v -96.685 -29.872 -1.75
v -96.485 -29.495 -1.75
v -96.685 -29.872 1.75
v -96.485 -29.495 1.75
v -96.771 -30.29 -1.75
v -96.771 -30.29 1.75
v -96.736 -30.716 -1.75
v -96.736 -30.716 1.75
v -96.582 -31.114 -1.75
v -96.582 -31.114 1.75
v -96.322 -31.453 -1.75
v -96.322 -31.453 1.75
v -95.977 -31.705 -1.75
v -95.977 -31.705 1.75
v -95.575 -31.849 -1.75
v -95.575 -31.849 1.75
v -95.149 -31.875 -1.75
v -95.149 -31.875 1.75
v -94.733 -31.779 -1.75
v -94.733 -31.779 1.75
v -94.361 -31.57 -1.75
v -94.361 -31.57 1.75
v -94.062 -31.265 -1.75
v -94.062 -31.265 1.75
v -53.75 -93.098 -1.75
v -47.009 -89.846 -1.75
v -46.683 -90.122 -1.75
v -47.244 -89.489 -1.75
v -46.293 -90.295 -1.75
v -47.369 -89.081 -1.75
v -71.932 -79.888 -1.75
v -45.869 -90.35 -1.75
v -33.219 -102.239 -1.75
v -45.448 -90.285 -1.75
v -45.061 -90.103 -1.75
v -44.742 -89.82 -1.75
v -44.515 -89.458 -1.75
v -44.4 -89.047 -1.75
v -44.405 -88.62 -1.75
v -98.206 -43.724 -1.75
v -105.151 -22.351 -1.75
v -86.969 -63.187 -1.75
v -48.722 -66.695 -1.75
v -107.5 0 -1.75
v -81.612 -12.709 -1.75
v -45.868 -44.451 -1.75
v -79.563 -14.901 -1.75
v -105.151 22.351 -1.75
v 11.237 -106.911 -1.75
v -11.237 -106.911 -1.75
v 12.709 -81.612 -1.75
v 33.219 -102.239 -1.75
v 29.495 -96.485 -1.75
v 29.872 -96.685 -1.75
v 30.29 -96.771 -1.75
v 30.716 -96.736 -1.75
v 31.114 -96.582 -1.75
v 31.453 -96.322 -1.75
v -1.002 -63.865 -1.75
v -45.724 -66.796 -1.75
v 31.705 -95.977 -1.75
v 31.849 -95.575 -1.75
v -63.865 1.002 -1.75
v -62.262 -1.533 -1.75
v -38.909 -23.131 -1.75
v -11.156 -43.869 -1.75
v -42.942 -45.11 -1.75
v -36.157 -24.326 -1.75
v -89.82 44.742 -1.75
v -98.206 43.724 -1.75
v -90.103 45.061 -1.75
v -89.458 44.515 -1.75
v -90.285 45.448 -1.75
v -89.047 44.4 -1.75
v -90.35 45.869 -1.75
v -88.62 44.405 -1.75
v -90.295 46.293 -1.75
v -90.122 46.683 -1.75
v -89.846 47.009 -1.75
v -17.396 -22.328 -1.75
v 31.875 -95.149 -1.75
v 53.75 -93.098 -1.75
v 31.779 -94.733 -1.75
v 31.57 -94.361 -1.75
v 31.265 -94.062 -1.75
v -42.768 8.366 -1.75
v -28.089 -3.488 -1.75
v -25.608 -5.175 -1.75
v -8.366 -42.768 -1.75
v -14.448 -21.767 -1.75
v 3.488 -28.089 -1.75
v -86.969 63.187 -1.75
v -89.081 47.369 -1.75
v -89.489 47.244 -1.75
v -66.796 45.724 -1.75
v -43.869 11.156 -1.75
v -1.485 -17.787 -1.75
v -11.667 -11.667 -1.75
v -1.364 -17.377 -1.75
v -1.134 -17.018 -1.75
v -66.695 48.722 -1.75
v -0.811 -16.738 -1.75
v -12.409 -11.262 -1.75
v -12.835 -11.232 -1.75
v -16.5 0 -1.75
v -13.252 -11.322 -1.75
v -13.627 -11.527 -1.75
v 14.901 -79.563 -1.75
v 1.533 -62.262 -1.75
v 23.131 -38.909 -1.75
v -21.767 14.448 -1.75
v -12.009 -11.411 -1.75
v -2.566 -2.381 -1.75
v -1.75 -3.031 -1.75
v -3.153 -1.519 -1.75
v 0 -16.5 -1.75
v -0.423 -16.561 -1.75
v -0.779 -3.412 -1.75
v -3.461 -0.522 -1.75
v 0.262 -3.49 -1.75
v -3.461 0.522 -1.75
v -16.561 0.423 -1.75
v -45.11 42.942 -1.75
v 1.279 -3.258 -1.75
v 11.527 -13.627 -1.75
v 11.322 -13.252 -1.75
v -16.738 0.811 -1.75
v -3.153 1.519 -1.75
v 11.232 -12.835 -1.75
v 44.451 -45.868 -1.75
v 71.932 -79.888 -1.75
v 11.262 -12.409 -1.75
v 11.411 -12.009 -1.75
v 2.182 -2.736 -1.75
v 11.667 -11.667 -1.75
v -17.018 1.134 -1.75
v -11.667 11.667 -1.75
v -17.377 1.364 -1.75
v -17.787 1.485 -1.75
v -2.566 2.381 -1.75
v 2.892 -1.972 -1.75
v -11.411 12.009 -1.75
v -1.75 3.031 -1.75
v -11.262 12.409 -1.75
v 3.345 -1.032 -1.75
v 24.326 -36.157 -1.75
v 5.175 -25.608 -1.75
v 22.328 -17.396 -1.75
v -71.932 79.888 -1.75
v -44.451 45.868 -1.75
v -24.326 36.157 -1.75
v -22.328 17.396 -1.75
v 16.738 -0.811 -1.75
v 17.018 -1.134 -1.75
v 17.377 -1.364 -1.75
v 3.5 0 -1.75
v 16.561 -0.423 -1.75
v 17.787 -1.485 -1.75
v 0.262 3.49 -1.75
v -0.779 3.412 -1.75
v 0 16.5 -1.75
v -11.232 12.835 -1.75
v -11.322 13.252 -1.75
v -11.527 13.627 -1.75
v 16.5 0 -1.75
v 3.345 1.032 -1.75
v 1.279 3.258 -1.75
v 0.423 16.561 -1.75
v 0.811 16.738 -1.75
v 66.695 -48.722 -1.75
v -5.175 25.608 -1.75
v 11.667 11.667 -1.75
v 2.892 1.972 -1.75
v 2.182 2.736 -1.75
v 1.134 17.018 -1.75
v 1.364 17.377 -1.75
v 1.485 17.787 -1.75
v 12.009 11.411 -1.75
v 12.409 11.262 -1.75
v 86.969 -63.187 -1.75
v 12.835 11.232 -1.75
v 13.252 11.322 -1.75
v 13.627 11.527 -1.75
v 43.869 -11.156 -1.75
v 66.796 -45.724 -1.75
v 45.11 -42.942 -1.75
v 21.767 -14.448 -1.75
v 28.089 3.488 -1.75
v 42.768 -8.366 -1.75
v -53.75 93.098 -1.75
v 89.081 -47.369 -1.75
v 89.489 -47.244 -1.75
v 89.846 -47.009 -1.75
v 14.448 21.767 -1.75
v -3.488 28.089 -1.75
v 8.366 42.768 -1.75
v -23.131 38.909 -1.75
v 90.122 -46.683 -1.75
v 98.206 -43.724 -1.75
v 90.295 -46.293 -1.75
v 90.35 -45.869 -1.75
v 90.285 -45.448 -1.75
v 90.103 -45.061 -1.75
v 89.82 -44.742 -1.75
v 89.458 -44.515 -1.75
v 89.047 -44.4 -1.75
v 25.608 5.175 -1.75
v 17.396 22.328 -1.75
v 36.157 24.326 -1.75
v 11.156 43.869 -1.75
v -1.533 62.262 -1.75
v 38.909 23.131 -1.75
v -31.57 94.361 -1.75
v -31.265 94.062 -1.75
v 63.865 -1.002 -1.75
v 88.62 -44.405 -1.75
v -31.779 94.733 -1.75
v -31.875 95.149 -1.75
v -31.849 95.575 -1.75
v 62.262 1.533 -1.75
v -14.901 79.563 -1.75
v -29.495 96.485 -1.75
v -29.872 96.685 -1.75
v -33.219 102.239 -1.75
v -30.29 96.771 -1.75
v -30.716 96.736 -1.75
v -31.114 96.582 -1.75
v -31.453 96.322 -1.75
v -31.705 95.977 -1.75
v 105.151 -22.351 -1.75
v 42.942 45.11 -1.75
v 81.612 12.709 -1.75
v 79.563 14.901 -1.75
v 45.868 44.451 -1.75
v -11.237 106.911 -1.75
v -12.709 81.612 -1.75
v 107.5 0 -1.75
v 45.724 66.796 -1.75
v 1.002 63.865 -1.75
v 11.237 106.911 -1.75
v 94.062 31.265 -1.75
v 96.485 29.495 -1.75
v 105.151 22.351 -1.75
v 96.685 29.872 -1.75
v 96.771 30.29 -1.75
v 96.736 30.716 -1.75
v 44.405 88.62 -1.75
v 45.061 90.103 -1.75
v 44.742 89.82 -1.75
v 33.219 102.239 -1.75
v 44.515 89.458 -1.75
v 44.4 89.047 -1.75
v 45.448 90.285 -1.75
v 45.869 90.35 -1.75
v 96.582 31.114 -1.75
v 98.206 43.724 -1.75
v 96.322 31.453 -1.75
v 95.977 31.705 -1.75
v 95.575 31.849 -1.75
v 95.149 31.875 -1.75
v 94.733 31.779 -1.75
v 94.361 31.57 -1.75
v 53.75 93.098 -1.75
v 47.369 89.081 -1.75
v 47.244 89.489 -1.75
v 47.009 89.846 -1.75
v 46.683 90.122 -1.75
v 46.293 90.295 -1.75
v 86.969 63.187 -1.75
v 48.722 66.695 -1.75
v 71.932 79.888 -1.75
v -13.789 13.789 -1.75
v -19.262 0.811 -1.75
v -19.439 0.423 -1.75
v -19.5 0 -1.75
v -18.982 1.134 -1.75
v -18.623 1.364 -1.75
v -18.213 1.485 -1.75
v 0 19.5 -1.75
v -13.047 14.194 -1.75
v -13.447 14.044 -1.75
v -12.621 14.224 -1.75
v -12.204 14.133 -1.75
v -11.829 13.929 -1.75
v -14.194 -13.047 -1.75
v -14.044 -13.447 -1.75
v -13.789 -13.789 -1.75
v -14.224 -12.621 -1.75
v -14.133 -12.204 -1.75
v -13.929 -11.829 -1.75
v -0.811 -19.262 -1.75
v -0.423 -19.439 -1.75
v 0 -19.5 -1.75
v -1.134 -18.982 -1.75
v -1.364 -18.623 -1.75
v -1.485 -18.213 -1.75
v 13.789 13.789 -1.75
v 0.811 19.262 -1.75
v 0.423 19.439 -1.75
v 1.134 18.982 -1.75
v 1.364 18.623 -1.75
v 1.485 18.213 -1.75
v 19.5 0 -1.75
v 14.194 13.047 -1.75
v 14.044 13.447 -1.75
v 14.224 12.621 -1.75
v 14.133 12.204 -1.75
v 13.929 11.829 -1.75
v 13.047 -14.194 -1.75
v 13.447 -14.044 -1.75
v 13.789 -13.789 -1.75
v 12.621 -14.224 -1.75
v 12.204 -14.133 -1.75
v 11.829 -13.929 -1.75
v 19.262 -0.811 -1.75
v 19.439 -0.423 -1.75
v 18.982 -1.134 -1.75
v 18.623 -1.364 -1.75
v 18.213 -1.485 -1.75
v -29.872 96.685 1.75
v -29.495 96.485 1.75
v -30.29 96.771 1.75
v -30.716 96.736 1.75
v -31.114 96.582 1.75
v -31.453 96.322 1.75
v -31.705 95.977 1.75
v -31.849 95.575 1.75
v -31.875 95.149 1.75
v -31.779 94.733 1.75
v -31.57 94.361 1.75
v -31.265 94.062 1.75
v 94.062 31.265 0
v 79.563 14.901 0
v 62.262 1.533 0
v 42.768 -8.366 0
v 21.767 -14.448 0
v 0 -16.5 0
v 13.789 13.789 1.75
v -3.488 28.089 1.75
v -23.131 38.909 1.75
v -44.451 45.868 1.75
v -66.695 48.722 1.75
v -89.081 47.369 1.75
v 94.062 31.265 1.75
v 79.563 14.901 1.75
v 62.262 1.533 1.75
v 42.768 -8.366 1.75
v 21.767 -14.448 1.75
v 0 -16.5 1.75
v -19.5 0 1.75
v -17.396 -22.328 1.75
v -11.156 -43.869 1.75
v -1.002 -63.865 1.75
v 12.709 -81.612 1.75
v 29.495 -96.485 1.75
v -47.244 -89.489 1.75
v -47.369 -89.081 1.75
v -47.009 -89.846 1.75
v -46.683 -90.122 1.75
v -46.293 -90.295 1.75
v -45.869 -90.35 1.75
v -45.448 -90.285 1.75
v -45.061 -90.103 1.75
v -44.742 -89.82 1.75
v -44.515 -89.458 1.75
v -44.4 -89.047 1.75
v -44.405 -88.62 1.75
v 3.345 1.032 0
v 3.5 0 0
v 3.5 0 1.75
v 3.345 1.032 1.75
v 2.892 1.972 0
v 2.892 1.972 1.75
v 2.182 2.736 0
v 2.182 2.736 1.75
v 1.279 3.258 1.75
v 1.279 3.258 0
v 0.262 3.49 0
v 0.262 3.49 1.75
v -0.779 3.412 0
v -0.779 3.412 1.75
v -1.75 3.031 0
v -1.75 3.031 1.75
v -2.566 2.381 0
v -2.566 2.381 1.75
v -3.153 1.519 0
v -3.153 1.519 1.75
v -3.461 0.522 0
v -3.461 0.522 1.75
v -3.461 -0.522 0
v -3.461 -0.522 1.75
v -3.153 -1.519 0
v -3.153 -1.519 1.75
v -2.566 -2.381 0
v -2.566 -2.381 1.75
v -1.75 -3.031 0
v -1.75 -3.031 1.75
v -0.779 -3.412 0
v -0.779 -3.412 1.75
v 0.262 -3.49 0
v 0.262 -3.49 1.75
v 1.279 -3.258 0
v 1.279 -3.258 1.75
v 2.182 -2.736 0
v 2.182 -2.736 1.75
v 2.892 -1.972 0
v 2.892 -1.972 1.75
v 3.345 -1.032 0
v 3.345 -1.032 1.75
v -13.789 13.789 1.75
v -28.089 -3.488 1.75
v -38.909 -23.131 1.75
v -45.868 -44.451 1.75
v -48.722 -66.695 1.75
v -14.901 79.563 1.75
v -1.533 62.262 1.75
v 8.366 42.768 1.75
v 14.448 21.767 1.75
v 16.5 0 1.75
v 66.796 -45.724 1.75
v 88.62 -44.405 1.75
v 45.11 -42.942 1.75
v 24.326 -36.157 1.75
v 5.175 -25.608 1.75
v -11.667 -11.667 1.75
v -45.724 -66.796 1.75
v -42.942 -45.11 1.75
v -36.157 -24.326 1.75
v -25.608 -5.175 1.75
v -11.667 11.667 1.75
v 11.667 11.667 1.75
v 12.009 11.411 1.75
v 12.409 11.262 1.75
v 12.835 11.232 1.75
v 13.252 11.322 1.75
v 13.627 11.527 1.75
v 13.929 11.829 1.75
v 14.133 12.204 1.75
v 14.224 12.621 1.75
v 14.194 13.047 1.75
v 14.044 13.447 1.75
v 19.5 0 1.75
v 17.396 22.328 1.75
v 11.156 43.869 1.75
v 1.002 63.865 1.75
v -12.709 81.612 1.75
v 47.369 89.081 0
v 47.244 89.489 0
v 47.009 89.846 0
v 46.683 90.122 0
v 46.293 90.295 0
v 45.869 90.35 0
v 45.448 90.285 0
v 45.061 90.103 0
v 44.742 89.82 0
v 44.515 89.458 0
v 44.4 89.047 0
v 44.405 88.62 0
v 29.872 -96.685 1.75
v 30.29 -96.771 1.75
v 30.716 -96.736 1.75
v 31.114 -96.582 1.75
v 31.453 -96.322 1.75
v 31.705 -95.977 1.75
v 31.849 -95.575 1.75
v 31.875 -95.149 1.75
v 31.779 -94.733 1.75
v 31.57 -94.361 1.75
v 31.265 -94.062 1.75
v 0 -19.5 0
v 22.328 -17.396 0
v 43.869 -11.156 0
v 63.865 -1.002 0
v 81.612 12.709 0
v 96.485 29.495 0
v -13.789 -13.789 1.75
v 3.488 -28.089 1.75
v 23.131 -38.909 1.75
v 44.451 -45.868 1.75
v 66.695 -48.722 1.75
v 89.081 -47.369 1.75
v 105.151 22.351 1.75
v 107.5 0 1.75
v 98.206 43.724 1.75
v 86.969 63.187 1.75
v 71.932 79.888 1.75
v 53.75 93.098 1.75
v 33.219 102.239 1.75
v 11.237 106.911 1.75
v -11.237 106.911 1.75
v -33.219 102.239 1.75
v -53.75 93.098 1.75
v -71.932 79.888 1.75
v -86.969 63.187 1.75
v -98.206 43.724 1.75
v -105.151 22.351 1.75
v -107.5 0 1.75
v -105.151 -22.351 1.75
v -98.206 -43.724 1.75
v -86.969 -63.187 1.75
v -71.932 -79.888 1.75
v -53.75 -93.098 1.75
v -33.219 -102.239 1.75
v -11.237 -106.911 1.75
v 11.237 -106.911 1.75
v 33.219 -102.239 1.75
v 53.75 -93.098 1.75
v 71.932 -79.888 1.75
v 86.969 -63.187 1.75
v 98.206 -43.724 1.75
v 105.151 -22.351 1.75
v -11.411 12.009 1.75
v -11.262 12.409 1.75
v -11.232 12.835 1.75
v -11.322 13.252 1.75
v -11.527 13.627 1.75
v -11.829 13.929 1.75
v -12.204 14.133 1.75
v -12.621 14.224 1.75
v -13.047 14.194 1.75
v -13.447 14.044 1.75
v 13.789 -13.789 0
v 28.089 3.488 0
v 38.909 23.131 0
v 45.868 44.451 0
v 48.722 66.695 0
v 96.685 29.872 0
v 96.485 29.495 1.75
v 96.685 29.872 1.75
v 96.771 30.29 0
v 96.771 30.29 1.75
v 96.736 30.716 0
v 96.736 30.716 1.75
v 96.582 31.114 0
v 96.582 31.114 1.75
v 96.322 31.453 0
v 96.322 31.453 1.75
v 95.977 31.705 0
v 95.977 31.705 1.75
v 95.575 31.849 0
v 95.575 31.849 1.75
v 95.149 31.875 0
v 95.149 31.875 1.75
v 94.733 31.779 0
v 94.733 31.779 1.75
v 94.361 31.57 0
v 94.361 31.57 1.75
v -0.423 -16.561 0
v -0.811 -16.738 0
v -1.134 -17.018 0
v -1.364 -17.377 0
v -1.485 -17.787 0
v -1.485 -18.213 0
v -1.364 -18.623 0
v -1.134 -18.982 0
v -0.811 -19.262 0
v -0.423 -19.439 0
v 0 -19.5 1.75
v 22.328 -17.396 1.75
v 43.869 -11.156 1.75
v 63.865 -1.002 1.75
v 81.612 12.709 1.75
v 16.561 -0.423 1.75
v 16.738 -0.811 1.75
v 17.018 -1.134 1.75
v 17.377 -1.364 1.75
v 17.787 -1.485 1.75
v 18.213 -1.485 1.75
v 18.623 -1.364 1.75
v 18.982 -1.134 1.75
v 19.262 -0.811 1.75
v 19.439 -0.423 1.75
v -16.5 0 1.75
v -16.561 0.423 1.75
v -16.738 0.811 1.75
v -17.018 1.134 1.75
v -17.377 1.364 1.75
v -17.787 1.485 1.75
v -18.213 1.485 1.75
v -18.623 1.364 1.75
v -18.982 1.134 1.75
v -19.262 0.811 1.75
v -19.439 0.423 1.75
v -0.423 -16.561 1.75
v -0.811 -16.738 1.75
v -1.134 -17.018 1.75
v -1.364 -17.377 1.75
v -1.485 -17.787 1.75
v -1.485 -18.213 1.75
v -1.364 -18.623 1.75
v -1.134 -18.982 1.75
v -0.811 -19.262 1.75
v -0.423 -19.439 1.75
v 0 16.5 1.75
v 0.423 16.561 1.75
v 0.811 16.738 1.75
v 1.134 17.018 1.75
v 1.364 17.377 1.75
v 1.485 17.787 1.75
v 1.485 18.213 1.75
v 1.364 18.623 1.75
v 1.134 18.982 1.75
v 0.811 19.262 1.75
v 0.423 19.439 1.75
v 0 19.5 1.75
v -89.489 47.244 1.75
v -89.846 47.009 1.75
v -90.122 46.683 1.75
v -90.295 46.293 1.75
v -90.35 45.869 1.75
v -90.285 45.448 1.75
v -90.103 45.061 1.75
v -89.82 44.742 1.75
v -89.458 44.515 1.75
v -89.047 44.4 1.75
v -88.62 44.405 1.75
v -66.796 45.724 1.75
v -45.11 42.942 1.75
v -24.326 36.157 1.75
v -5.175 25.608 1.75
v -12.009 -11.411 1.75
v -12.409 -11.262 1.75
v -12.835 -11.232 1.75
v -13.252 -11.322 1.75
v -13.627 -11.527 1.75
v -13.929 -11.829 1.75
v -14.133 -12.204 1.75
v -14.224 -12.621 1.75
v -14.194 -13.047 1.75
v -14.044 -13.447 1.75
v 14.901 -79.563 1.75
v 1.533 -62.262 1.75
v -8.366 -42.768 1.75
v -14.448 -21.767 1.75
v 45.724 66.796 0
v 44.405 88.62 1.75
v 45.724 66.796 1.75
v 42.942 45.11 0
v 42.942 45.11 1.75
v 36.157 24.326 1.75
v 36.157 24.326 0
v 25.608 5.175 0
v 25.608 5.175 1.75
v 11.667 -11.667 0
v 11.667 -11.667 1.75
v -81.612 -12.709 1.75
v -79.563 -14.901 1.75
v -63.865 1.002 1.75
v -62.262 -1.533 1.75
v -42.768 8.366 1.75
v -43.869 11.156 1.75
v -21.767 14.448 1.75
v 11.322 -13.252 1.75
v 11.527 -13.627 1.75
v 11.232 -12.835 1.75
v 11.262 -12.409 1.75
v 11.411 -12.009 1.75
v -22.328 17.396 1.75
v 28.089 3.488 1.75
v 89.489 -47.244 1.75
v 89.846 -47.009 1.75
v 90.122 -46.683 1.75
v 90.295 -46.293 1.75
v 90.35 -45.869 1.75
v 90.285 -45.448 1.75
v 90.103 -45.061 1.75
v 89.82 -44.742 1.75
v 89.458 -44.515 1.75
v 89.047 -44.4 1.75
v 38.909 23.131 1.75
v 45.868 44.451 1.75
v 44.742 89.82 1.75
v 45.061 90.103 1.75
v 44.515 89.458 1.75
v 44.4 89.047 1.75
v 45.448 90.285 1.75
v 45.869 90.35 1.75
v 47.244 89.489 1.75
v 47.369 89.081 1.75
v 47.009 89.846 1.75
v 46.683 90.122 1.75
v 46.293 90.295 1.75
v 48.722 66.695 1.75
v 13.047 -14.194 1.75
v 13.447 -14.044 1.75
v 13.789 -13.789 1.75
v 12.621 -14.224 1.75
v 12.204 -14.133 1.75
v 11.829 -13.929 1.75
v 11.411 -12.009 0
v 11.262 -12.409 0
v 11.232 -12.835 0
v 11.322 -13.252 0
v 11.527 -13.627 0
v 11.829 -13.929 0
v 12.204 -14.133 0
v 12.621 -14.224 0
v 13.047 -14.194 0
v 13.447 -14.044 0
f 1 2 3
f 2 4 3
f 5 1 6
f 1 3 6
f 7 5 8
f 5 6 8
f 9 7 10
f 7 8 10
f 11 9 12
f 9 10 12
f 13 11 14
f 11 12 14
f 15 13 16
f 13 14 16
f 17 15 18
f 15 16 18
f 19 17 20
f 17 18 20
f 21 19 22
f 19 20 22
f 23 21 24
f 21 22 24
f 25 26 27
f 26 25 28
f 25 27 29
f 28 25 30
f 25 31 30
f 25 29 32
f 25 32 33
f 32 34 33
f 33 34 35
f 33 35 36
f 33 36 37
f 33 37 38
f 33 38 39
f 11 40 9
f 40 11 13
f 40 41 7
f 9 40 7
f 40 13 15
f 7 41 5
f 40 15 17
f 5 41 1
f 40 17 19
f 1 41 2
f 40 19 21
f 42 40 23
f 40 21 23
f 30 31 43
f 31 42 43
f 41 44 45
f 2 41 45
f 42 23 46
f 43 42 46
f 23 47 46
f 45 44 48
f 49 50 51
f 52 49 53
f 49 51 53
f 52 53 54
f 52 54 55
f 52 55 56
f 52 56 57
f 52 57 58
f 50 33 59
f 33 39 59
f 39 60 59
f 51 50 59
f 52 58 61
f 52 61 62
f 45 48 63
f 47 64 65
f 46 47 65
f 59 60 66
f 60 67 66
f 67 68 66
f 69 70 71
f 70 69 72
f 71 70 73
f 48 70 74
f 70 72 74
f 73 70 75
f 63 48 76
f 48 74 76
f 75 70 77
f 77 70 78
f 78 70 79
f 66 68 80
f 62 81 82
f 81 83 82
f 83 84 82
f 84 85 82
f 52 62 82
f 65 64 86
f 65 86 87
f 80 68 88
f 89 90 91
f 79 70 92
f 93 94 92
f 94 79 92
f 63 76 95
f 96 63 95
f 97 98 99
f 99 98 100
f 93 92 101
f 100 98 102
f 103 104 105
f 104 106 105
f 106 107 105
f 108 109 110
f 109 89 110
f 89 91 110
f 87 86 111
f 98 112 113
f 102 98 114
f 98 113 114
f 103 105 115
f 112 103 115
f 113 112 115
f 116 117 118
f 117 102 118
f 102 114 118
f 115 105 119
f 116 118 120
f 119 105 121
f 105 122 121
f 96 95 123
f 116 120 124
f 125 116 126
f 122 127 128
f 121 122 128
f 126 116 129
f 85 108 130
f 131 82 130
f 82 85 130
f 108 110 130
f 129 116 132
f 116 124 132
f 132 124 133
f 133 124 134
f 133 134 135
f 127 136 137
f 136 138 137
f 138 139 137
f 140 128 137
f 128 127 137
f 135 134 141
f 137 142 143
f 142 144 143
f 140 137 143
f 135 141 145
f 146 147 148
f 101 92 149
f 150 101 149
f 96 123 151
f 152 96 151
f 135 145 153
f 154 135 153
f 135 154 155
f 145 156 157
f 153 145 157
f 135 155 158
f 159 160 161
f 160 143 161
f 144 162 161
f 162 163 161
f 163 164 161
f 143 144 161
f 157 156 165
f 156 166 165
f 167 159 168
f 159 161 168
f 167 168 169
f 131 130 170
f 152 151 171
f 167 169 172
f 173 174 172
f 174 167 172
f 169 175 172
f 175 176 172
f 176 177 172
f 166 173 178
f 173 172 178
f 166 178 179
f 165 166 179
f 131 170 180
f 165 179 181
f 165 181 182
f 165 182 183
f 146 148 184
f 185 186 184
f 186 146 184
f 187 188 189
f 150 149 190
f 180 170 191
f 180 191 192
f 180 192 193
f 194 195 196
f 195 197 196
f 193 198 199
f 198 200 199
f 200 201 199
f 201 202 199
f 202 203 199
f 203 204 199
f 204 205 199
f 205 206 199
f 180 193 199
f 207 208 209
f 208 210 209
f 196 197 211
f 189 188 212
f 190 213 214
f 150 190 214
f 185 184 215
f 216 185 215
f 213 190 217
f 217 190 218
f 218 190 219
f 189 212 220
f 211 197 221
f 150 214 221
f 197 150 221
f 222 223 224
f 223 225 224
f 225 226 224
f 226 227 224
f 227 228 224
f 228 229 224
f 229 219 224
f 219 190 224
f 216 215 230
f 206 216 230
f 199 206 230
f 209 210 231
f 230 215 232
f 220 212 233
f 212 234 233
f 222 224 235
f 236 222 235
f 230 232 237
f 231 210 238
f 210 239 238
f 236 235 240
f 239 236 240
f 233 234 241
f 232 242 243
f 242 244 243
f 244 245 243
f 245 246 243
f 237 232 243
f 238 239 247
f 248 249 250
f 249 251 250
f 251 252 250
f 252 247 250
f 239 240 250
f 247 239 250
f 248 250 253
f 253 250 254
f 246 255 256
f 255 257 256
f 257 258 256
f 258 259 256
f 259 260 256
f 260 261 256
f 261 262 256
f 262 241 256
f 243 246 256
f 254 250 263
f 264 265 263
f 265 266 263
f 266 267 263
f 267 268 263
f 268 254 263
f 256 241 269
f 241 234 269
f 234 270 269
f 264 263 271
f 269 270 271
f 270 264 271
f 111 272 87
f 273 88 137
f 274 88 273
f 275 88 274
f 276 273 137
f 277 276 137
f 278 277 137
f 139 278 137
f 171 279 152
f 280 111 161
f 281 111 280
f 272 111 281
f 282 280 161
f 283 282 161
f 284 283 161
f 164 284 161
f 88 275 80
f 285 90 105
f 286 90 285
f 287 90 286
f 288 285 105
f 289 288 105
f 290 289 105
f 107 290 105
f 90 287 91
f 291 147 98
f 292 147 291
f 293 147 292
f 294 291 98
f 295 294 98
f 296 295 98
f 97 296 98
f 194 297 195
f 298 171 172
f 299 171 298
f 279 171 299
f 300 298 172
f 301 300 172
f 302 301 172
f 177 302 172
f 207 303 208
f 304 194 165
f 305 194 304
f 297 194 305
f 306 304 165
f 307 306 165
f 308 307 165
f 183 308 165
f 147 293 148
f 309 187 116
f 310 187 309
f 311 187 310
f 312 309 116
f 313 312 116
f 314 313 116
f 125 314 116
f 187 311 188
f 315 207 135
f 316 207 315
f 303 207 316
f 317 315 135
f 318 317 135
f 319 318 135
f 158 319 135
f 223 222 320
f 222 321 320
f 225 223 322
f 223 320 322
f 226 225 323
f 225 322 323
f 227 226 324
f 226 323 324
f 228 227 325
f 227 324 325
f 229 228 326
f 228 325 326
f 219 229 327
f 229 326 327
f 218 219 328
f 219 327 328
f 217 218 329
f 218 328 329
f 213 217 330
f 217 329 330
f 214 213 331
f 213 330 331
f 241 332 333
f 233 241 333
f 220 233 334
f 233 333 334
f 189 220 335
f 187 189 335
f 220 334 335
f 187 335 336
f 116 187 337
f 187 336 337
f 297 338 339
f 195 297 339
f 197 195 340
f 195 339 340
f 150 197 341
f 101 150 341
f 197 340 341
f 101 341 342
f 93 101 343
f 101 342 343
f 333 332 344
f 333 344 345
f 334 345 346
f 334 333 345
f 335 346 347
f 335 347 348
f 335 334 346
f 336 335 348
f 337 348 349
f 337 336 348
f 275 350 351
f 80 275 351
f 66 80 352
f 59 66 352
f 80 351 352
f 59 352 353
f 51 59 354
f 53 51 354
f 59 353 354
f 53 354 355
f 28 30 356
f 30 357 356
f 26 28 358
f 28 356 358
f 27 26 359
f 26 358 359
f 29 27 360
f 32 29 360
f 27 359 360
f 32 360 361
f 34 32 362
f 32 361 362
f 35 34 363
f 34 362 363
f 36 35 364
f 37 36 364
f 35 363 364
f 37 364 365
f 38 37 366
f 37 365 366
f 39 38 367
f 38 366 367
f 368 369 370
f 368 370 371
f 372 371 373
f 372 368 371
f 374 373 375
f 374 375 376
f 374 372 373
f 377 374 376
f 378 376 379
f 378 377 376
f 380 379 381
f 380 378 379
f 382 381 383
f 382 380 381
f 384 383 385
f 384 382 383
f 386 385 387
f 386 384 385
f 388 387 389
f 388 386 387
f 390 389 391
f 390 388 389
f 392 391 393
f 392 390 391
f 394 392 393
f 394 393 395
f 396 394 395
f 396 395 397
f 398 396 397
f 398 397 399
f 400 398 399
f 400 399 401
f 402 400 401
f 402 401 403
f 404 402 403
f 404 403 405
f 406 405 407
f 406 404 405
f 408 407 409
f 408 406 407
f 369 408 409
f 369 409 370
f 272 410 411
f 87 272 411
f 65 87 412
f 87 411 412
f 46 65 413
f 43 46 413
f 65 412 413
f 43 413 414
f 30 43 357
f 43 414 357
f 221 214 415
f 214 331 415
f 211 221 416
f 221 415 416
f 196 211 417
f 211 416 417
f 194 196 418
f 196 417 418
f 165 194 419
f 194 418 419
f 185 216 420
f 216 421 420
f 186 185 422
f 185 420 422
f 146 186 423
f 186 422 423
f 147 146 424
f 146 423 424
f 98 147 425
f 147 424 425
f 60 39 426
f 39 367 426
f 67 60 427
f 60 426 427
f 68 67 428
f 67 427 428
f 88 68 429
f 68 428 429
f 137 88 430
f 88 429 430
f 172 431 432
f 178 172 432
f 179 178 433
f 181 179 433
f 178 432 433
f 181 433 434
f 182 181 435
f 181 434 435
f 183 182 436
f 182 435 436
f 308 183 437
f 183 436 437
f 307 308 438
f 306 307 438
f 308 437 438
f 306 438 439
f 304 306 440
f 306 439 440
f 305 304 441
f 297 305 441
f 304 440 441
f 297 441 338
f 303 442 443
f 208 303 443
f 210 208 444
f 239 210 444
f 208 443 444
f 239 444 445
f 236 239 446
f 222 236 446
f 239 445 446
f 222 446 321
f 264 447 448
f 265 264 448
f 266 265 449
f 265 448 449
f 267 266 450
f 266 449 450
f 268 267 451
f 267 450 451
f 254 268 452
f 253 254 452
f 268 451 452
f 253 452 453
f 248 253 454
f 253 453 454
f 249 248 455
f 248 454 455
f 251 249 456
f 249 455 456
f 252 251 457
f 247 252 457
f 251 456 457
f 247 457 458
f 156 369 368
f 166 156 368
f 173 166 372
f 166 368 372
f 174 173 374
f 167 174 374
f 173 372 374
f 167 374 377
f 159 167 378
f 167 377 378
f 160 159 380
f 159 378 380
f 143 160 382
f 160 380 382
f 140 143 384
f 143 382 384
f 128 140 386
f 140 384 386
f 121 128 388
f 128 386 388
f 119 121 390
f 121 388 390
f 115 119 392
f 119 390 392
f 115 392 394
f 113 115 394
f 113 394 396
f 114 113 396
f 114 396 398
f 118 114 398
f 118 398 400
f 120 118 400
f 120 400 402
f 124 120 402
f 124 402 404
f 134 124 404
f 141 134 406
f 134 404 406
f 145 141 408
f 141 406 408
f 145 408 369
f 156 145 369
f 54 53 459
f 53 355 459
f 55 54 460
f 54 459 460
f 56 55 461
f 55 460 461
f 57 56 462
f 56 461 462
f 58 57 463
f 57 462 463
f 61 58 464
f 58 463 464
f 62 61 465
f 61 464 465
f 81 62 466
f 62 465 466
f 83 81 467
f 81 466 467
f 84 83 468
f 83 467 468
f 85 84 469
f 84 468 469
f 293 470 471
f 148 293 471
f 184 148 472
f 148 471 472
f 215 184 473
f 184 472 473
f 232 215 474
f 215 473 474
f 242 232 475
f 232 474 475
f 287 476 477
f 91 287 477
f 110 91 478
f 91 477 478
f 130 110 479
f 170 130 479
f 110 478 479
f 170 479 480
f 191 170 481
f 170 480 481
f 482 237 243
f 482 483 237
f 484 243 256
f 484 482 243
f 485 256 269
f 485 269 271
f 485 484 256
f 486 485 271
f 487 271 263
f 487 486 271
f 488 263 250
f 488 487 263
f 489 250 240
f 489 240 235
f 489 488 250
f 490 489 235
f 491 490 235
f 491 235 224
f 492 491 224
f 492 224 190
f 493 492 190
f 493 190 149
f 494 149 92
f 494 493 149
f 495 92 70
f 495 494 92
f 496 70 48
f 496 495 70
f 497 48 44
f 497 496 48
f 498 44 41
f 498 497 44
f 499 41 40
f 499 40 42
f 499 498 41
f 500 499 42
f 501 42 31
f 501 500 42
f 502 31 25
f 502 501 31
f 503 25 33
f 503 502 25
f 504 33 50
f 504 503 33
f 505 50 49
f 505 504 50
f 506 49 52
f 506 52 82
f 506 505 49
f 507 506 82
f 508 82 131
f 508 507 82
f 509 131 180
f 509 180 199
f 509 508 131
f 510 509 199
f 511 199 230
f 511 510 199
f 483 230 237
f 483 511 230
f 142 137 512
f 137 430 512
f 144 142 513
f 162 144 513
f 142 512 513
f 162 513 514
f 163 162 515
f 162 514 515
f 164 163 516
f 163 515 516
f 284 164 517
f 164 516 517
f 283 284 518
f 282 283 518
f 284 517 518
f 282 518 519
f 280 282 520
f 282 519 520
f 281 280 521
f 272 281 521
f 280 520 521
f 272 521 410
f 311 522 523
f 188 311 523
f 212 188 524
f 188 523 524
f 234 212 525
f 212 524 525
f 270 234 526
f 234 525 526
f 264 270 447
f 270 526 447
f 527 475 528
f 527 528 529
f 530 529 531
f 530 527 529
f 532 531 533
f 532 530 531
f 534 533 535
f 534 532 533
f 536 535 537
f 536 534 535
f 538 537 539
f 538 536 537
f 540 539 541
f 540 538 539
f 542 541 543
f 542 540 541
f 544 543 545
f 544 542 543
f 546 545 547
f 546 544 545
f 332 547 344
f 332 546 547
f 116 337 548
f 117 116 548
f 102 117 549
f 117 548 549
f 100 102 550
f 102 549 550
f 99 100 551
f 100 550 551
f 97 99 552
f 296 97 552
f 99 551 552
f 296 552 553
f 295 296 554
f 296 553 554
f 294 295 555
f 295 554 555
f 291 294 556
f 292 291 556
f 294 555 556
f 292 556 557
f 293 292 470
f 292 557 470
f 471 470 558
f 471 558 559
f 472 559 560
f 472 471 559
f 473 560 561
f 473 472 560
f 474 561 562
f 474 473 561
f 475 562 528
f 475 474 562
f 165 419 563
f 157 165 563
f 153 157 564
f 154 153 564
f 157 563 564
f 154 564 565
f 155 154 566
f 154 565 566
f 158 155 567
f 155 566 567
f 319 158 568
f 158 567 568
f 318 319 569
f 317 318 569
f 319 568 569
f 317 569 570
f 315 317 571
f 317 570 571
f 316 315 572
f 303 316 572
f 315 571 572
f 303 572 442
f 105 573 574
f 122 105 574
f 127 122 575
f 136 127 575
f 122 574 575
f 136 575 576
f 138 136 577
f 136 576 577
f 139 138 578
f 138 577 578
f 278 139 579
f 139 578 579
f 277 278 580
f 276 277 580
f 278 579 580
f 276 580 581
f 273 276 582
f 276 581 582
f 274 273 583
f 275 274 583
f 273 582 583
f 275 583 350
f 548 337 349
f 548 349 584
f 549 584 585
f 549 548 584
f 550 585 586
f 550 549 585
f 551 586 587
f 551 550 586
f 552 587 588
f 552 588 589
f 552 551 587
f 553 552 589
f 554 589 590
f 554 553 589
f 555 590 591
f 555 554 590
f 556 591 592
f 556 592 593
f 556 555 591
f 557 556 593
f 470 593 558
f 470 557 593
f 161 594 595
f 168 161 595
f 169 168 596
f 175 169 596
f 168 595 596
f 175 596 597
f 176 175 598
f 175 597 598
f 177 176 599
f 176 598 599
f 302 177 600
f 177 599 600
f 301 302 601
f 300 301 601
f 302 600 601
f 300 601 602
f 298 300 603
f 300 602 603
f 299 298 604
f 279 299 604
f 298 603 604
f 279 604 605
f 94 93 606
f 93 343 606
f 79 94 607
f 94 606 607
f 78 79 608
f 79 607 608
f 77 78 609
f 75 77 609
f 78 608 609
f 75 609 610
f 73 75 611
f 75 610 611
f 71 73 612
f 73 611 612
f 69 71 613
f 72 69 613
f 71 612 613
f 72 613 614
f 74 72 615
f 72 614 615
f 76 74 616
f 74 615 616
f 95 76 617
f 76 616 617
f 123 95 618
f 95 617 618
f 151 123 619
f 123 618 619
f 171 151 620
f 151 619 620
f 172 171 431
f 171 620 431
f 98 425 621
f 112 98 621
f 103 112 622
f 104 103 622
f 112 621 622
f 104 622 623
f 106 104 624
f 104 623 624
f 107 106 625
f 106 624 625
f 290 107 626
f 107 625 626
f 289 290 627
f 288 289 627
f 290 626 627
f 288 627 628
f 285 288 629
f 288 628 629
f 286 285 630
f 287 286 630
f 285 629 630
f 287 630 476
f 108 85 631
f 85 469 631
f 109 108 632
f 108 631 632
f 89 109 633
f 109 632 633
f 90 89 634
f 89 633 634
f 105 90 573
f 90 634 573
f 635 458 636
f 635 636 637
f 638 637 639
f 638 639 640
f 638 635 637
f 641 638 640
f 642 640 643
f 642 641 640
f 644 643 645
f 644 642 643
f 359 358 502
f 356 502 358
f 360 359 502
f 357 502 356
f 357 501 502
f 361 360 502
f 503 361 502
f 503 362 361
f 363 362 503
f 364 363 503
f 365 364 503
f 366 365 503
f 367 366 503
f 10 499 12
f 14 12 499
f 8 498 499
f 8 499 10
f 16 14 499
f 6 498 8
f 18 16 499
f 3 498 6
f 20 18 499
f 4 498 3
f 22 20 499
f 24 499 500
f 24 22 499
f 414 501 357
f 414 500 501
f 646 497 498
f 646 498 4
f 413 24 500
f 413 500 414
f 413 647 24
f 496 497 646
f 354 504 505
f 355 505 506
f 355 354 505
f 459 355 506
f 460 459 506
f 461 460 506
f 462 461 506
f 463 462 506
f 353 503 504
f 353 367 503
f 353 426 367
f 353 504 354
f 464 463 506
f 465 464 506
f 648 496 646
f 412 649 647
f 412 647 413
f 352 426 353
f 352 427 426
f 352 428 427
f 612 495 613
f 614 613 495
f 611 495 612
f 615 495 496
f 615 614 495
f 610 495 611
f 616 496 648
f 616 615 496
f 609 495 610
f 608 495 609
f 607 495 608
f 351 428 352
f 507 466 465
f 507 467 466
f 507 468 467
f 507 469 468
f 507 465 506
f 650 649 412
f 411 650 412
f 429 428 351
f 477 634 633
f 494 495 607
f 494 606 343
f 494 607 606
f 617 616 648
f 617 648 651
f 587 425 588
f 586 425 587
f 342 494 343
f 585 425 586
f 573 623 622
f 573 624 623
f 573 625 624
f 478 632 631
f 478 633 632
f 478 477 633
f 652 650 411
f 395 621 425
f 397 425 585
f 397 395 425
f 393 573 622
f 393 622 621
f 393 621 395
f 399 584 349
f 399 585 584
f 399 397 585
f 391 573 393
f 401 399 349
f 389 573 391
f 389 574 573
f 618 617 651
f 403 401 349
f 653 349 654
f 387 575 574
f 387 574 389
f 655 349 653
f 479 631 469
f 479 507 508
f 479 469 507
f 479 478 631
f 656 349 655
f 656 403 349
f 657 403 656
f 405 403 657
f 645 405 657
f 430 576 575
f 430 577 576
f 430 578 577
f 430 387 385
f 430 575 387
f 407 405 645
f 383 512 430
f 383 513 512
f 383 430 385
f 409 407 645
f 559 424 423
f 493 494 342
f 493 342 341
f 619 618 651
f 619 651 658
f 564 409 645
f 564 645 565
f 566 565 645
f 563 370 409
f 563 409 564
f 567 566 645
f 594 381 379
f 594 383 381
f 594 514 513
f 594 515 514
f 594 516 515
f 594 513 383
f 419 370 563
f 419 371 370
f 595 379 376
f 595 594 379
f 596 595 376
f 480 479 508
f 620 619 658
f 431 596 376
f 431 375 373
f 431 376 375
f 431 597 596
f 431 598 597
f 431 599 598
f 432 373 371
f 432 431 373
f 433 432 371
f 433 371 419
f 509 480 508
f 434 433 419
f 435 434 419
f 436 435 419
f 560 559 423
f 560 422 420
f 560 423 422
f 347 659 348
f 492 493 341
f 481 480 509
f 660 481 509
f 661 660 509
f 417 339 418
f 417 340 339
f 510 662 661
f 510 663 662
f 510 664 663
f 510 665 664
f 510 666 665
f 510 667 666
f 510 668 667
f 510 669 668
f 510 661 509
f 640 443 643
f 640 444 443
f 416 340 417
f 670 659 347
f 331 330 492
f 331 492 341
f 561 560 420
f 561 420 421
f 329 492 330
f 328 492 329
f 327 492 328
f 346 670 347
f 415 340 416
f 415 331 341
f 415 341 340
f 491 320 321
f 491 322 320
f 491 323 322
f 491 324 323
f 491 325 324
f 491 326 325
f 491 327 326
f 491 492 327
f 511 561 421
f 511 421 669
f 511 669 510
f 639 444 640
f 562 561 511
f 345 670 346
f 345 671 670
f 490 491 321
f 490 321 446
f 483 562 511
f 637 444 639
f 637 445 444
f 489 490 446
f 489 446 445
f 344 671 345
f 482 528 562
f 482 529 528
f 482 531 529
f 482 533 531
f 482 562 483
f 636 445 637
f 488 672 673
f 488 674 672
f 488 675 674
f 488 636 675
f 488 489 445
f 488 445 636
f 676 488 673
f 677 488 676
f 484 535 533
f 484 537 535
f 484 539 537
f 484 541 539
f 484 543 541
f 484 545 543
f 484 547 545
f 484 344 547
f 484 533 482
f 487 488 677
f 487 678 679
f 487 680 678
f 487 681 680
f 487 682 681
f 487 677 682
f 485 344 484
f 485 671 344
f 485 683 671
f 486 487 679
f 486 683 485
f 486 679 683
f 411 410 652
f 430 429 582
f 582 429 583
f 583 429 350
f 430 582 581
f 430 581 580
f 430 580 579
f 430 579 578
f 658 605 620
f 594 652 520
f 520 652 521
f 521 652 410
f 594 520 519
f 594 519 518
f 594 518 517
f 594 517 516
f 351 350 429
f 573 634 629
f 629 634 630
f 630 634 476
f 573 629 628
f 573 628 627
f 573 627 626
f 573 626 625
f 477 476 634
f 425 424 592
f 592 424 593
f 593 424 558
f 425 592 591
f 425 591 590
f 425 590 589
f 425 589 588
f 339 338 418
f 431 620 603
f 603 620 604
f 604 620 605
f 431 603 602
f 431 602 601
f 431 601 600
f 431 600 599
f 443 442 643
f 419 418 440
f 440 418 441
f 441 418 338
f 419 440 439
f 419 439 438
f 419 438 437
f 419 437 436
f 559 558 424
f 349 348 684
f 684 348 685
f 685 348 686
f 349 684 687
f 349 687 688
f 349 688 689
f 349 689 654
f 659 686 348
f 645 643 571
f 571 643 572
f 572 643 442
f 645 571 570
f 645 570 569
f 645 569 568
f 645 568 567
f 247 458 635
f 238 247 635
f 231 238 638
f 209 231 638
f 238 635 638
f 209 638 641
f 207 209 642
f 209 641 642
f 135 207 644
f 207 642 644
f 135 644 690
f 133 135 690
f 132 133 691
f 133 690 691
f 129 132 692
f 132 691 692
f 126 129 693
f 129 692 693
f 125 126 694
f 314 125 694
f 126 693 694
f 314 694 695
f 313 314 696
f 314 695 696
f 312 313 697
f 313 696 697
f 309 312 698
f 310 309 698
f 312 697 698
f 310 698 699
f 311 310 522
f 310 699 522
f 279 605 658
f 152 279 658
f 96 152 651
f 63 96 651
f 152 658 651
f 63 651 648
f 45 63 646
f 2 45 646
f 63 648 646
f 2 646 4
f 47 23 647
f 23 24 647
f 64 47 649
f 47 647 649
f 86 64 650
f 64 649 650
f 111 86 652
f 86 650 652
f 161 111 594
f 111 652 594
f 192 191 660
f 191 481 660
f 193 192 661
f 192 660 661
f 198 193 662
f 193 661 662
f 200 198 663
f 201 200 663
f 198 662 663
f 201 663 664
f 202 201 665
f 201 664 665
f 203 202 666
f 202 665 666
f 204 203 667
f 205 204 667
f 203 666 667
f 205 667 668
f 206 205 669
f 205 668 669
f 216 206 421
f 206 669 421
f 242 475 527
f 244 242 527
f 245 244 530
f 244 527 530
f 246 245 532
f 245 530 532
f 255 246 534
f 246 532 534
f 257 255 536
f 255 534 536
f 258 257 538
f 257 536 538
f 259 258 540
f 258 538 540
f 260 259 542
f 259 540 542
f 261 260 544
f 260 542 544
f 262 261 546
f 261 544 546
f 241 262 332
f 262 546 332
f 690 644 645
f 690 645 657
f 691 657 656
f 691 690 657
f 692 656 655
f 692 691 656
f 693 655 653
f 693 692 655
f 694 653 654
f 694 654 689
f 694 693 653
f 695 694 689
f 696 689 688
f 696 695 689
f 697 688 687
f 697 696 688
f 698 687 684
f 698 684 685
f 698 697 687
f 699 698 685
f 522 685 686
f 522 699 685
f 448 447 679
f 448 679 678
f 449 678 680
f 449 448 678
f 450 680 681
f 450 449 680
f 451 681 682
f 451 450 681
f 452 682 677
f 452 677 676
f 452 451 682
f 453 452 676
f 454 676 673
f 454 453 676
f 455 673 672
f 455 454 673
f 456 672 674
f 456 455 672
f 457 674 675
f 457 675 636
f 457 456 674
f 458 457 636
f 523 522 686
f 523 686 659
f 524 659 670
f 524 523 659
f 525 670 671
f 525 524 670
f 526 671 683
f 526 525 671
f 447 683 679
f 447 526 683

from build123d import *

# Parameters (mm, degrees)
SKETCH1_R                = 107.5
SKETCH1_R_2              = 3.5
BOSS_EXTRUDE1_DEPTH      = 1.75
BOSS_EXTRUDE1_DEPTH_BACK = 1.75


with BuildPart() as part:
    # Sketch1 → Boss-Extrude1 (new body, two sides)
    with BuildSketch(Plane.XY) as boss_extrude1_sk:
        Circle(SKETCH1_R)
        Circle(SKETCH1_R_2, mode=Mode.SUBTRACT)
        with BuildLine():
            ThreePointArc((0, 19.5), (-54.1059262, 6.549513138), (-96.484687775, -29.495))
            ThreePointArc((-96.484687775, -29.495), (-96.158582907, -31.591104867), (-94.06247804, -31.265))
            ThreePointArc((-94.06247804, -31.265), (-52.74761843, 3.874629963), (0, 16.5))
            ThreePointArc((0, 16.5), (1.5, 18), (0, 19.5))
        make_face(mode=Mode.SUBTRACT)
        with BuildLine():
            ThreePointArc((13.788582233, 13.788582233), (-33.627462165, 42.889872472), (-89.081091517, 47.368862495))
            ThreePointArc((-89.081091517, 47.368862495), (-90.33267052, 45.656101566), (-88.619909591, 44.404522563))
            ThreePointArc((-88.619909591, 44.404522563), (-34.558421561, 40.037975805), (11.66726189, 11.66726189))
            ThreePointArc((11.66726189, 11.66726189), (13.788582233, 11.66726189), (13.788582233, 13.788582233))
        make_face(mode=Mode.SUBTRACT)
        with BuildLine():
            ThreePointArc((19.5, 0), (6.549513138, 54.1059262), (-29.495, 96.484687775))
            ThreePointArc((-29.495, 96.484687775), (-31.591104867, 96.158582907), (-31.265, 94.06247804))
            ThreePointArc((-31.265, 94.06247804), (3.874629963, 52.74761843), (16.5, 0))
            ThreePointArc((16.5, 0), (18, -1.5), (19.5, 0))
        make_face(mode=Mode.SUBTRACT)
        with BuildLine():
            ThreePointArc((13.788582233, -13.788582233), (42.889872472, 33.627462165), (47.368862495, 89.081091517))
            ThreePointArc((47.368862495, 89.081091517), (45.656101566, 90.33267052), (44.404522563, 88.619909591))
            ThreePointArc((44.404522563, 88.619909591), (40.037975805, 34.558421561), (11.66726189, -11.66726189))
            ThreePointArc((11.66726189, -11.66726189), (11.66726189, -13.788582233), (13.788582233, -13.788582233))
        make_face(mode=Mode.SUBTRACT)
        with BuildLine():
            ThreePointArc((0, -19.5), (54.1059262, -6.549513138), (96.484687775, 29.495))
            ThreePointArc((96.484687775, 29.495), (96.158582907, 31.591104867), (94.06247804, 31.265))
            ThreePointArc((94.06247804, 31.265), (52.74761843, -3.874629963), (0, -16.5))
            ThreePointArc((0, -16.5), (-1.5, -18), (0, -19.5))
        make_face(mode=Mode.SUBTRACT)
        with BuildLine():
            ThreePointArc((-13.788582233, -13.788582233), (33.627462165, -42.889872472), (89.081091517, -47.368862495))
            ThreePointArc((89.081091517, -47.368862495), (90.33267052, -45.656101566), (88.619909591, -44.404522563))
            ThreePointArc((88.619909591, -44.404522563), (34.558421561, -40.037975805), (-11.66726189, -11.66726189))
            ThreePointArc((-11.66726189, -11.66726189), (-13.788582233, -11.66726189), (-13.788582233, -13.788582233))
        make_face(mode=Mode.SUBTRACT)
        with BuildLine():
            ThreePointArc((-19.5, 0), (-6.549513138, -54.1059262), (29.495, -96.484687775))
            ThreePointArc((29.495, -96.484687775), (31.591104867, -96.158582907), (31.265, -94.06247804))
            ThreePointArc((31.265, -94.06247804), (-3.874629963, -52.74761843), (-16.5, 0))
            ThreePointArc((-16.5, 0), (-18, 1.5), (-19.5, 0))
        make_face(mode=Mode.SUBTRACT)
        with BuildLine():
            ThreePointArc((-13.788582233, 13.788582233), (-42.889872472, -33.627462165), (-47.368862495, -89.081091517))
            ThreePointArc((-47.368862495, -89.081091517), (-45.656101566, -90.33267052), (-44.404522563, -88.619909591))
            ThreePointArc((-44.404522563, -88.619909591), (-40.037975805, -34.558421561), (-11.66726189, 11.66726189))
            ThreePointArc((-11.66726189, 11.66726189), (-11.66726189, 13.788582233), (-13.788582233, 13.788582233))
        make_face(mode=Mode.SUBTRACT)
    extrude(amount=BOSS_EXTRUDE1_DEPTH)
    extrude(boss_extrude1_sk.sketch, amount=-BOSS_EXTRUDE1_DEPTH_BACK)


solid = part.part
